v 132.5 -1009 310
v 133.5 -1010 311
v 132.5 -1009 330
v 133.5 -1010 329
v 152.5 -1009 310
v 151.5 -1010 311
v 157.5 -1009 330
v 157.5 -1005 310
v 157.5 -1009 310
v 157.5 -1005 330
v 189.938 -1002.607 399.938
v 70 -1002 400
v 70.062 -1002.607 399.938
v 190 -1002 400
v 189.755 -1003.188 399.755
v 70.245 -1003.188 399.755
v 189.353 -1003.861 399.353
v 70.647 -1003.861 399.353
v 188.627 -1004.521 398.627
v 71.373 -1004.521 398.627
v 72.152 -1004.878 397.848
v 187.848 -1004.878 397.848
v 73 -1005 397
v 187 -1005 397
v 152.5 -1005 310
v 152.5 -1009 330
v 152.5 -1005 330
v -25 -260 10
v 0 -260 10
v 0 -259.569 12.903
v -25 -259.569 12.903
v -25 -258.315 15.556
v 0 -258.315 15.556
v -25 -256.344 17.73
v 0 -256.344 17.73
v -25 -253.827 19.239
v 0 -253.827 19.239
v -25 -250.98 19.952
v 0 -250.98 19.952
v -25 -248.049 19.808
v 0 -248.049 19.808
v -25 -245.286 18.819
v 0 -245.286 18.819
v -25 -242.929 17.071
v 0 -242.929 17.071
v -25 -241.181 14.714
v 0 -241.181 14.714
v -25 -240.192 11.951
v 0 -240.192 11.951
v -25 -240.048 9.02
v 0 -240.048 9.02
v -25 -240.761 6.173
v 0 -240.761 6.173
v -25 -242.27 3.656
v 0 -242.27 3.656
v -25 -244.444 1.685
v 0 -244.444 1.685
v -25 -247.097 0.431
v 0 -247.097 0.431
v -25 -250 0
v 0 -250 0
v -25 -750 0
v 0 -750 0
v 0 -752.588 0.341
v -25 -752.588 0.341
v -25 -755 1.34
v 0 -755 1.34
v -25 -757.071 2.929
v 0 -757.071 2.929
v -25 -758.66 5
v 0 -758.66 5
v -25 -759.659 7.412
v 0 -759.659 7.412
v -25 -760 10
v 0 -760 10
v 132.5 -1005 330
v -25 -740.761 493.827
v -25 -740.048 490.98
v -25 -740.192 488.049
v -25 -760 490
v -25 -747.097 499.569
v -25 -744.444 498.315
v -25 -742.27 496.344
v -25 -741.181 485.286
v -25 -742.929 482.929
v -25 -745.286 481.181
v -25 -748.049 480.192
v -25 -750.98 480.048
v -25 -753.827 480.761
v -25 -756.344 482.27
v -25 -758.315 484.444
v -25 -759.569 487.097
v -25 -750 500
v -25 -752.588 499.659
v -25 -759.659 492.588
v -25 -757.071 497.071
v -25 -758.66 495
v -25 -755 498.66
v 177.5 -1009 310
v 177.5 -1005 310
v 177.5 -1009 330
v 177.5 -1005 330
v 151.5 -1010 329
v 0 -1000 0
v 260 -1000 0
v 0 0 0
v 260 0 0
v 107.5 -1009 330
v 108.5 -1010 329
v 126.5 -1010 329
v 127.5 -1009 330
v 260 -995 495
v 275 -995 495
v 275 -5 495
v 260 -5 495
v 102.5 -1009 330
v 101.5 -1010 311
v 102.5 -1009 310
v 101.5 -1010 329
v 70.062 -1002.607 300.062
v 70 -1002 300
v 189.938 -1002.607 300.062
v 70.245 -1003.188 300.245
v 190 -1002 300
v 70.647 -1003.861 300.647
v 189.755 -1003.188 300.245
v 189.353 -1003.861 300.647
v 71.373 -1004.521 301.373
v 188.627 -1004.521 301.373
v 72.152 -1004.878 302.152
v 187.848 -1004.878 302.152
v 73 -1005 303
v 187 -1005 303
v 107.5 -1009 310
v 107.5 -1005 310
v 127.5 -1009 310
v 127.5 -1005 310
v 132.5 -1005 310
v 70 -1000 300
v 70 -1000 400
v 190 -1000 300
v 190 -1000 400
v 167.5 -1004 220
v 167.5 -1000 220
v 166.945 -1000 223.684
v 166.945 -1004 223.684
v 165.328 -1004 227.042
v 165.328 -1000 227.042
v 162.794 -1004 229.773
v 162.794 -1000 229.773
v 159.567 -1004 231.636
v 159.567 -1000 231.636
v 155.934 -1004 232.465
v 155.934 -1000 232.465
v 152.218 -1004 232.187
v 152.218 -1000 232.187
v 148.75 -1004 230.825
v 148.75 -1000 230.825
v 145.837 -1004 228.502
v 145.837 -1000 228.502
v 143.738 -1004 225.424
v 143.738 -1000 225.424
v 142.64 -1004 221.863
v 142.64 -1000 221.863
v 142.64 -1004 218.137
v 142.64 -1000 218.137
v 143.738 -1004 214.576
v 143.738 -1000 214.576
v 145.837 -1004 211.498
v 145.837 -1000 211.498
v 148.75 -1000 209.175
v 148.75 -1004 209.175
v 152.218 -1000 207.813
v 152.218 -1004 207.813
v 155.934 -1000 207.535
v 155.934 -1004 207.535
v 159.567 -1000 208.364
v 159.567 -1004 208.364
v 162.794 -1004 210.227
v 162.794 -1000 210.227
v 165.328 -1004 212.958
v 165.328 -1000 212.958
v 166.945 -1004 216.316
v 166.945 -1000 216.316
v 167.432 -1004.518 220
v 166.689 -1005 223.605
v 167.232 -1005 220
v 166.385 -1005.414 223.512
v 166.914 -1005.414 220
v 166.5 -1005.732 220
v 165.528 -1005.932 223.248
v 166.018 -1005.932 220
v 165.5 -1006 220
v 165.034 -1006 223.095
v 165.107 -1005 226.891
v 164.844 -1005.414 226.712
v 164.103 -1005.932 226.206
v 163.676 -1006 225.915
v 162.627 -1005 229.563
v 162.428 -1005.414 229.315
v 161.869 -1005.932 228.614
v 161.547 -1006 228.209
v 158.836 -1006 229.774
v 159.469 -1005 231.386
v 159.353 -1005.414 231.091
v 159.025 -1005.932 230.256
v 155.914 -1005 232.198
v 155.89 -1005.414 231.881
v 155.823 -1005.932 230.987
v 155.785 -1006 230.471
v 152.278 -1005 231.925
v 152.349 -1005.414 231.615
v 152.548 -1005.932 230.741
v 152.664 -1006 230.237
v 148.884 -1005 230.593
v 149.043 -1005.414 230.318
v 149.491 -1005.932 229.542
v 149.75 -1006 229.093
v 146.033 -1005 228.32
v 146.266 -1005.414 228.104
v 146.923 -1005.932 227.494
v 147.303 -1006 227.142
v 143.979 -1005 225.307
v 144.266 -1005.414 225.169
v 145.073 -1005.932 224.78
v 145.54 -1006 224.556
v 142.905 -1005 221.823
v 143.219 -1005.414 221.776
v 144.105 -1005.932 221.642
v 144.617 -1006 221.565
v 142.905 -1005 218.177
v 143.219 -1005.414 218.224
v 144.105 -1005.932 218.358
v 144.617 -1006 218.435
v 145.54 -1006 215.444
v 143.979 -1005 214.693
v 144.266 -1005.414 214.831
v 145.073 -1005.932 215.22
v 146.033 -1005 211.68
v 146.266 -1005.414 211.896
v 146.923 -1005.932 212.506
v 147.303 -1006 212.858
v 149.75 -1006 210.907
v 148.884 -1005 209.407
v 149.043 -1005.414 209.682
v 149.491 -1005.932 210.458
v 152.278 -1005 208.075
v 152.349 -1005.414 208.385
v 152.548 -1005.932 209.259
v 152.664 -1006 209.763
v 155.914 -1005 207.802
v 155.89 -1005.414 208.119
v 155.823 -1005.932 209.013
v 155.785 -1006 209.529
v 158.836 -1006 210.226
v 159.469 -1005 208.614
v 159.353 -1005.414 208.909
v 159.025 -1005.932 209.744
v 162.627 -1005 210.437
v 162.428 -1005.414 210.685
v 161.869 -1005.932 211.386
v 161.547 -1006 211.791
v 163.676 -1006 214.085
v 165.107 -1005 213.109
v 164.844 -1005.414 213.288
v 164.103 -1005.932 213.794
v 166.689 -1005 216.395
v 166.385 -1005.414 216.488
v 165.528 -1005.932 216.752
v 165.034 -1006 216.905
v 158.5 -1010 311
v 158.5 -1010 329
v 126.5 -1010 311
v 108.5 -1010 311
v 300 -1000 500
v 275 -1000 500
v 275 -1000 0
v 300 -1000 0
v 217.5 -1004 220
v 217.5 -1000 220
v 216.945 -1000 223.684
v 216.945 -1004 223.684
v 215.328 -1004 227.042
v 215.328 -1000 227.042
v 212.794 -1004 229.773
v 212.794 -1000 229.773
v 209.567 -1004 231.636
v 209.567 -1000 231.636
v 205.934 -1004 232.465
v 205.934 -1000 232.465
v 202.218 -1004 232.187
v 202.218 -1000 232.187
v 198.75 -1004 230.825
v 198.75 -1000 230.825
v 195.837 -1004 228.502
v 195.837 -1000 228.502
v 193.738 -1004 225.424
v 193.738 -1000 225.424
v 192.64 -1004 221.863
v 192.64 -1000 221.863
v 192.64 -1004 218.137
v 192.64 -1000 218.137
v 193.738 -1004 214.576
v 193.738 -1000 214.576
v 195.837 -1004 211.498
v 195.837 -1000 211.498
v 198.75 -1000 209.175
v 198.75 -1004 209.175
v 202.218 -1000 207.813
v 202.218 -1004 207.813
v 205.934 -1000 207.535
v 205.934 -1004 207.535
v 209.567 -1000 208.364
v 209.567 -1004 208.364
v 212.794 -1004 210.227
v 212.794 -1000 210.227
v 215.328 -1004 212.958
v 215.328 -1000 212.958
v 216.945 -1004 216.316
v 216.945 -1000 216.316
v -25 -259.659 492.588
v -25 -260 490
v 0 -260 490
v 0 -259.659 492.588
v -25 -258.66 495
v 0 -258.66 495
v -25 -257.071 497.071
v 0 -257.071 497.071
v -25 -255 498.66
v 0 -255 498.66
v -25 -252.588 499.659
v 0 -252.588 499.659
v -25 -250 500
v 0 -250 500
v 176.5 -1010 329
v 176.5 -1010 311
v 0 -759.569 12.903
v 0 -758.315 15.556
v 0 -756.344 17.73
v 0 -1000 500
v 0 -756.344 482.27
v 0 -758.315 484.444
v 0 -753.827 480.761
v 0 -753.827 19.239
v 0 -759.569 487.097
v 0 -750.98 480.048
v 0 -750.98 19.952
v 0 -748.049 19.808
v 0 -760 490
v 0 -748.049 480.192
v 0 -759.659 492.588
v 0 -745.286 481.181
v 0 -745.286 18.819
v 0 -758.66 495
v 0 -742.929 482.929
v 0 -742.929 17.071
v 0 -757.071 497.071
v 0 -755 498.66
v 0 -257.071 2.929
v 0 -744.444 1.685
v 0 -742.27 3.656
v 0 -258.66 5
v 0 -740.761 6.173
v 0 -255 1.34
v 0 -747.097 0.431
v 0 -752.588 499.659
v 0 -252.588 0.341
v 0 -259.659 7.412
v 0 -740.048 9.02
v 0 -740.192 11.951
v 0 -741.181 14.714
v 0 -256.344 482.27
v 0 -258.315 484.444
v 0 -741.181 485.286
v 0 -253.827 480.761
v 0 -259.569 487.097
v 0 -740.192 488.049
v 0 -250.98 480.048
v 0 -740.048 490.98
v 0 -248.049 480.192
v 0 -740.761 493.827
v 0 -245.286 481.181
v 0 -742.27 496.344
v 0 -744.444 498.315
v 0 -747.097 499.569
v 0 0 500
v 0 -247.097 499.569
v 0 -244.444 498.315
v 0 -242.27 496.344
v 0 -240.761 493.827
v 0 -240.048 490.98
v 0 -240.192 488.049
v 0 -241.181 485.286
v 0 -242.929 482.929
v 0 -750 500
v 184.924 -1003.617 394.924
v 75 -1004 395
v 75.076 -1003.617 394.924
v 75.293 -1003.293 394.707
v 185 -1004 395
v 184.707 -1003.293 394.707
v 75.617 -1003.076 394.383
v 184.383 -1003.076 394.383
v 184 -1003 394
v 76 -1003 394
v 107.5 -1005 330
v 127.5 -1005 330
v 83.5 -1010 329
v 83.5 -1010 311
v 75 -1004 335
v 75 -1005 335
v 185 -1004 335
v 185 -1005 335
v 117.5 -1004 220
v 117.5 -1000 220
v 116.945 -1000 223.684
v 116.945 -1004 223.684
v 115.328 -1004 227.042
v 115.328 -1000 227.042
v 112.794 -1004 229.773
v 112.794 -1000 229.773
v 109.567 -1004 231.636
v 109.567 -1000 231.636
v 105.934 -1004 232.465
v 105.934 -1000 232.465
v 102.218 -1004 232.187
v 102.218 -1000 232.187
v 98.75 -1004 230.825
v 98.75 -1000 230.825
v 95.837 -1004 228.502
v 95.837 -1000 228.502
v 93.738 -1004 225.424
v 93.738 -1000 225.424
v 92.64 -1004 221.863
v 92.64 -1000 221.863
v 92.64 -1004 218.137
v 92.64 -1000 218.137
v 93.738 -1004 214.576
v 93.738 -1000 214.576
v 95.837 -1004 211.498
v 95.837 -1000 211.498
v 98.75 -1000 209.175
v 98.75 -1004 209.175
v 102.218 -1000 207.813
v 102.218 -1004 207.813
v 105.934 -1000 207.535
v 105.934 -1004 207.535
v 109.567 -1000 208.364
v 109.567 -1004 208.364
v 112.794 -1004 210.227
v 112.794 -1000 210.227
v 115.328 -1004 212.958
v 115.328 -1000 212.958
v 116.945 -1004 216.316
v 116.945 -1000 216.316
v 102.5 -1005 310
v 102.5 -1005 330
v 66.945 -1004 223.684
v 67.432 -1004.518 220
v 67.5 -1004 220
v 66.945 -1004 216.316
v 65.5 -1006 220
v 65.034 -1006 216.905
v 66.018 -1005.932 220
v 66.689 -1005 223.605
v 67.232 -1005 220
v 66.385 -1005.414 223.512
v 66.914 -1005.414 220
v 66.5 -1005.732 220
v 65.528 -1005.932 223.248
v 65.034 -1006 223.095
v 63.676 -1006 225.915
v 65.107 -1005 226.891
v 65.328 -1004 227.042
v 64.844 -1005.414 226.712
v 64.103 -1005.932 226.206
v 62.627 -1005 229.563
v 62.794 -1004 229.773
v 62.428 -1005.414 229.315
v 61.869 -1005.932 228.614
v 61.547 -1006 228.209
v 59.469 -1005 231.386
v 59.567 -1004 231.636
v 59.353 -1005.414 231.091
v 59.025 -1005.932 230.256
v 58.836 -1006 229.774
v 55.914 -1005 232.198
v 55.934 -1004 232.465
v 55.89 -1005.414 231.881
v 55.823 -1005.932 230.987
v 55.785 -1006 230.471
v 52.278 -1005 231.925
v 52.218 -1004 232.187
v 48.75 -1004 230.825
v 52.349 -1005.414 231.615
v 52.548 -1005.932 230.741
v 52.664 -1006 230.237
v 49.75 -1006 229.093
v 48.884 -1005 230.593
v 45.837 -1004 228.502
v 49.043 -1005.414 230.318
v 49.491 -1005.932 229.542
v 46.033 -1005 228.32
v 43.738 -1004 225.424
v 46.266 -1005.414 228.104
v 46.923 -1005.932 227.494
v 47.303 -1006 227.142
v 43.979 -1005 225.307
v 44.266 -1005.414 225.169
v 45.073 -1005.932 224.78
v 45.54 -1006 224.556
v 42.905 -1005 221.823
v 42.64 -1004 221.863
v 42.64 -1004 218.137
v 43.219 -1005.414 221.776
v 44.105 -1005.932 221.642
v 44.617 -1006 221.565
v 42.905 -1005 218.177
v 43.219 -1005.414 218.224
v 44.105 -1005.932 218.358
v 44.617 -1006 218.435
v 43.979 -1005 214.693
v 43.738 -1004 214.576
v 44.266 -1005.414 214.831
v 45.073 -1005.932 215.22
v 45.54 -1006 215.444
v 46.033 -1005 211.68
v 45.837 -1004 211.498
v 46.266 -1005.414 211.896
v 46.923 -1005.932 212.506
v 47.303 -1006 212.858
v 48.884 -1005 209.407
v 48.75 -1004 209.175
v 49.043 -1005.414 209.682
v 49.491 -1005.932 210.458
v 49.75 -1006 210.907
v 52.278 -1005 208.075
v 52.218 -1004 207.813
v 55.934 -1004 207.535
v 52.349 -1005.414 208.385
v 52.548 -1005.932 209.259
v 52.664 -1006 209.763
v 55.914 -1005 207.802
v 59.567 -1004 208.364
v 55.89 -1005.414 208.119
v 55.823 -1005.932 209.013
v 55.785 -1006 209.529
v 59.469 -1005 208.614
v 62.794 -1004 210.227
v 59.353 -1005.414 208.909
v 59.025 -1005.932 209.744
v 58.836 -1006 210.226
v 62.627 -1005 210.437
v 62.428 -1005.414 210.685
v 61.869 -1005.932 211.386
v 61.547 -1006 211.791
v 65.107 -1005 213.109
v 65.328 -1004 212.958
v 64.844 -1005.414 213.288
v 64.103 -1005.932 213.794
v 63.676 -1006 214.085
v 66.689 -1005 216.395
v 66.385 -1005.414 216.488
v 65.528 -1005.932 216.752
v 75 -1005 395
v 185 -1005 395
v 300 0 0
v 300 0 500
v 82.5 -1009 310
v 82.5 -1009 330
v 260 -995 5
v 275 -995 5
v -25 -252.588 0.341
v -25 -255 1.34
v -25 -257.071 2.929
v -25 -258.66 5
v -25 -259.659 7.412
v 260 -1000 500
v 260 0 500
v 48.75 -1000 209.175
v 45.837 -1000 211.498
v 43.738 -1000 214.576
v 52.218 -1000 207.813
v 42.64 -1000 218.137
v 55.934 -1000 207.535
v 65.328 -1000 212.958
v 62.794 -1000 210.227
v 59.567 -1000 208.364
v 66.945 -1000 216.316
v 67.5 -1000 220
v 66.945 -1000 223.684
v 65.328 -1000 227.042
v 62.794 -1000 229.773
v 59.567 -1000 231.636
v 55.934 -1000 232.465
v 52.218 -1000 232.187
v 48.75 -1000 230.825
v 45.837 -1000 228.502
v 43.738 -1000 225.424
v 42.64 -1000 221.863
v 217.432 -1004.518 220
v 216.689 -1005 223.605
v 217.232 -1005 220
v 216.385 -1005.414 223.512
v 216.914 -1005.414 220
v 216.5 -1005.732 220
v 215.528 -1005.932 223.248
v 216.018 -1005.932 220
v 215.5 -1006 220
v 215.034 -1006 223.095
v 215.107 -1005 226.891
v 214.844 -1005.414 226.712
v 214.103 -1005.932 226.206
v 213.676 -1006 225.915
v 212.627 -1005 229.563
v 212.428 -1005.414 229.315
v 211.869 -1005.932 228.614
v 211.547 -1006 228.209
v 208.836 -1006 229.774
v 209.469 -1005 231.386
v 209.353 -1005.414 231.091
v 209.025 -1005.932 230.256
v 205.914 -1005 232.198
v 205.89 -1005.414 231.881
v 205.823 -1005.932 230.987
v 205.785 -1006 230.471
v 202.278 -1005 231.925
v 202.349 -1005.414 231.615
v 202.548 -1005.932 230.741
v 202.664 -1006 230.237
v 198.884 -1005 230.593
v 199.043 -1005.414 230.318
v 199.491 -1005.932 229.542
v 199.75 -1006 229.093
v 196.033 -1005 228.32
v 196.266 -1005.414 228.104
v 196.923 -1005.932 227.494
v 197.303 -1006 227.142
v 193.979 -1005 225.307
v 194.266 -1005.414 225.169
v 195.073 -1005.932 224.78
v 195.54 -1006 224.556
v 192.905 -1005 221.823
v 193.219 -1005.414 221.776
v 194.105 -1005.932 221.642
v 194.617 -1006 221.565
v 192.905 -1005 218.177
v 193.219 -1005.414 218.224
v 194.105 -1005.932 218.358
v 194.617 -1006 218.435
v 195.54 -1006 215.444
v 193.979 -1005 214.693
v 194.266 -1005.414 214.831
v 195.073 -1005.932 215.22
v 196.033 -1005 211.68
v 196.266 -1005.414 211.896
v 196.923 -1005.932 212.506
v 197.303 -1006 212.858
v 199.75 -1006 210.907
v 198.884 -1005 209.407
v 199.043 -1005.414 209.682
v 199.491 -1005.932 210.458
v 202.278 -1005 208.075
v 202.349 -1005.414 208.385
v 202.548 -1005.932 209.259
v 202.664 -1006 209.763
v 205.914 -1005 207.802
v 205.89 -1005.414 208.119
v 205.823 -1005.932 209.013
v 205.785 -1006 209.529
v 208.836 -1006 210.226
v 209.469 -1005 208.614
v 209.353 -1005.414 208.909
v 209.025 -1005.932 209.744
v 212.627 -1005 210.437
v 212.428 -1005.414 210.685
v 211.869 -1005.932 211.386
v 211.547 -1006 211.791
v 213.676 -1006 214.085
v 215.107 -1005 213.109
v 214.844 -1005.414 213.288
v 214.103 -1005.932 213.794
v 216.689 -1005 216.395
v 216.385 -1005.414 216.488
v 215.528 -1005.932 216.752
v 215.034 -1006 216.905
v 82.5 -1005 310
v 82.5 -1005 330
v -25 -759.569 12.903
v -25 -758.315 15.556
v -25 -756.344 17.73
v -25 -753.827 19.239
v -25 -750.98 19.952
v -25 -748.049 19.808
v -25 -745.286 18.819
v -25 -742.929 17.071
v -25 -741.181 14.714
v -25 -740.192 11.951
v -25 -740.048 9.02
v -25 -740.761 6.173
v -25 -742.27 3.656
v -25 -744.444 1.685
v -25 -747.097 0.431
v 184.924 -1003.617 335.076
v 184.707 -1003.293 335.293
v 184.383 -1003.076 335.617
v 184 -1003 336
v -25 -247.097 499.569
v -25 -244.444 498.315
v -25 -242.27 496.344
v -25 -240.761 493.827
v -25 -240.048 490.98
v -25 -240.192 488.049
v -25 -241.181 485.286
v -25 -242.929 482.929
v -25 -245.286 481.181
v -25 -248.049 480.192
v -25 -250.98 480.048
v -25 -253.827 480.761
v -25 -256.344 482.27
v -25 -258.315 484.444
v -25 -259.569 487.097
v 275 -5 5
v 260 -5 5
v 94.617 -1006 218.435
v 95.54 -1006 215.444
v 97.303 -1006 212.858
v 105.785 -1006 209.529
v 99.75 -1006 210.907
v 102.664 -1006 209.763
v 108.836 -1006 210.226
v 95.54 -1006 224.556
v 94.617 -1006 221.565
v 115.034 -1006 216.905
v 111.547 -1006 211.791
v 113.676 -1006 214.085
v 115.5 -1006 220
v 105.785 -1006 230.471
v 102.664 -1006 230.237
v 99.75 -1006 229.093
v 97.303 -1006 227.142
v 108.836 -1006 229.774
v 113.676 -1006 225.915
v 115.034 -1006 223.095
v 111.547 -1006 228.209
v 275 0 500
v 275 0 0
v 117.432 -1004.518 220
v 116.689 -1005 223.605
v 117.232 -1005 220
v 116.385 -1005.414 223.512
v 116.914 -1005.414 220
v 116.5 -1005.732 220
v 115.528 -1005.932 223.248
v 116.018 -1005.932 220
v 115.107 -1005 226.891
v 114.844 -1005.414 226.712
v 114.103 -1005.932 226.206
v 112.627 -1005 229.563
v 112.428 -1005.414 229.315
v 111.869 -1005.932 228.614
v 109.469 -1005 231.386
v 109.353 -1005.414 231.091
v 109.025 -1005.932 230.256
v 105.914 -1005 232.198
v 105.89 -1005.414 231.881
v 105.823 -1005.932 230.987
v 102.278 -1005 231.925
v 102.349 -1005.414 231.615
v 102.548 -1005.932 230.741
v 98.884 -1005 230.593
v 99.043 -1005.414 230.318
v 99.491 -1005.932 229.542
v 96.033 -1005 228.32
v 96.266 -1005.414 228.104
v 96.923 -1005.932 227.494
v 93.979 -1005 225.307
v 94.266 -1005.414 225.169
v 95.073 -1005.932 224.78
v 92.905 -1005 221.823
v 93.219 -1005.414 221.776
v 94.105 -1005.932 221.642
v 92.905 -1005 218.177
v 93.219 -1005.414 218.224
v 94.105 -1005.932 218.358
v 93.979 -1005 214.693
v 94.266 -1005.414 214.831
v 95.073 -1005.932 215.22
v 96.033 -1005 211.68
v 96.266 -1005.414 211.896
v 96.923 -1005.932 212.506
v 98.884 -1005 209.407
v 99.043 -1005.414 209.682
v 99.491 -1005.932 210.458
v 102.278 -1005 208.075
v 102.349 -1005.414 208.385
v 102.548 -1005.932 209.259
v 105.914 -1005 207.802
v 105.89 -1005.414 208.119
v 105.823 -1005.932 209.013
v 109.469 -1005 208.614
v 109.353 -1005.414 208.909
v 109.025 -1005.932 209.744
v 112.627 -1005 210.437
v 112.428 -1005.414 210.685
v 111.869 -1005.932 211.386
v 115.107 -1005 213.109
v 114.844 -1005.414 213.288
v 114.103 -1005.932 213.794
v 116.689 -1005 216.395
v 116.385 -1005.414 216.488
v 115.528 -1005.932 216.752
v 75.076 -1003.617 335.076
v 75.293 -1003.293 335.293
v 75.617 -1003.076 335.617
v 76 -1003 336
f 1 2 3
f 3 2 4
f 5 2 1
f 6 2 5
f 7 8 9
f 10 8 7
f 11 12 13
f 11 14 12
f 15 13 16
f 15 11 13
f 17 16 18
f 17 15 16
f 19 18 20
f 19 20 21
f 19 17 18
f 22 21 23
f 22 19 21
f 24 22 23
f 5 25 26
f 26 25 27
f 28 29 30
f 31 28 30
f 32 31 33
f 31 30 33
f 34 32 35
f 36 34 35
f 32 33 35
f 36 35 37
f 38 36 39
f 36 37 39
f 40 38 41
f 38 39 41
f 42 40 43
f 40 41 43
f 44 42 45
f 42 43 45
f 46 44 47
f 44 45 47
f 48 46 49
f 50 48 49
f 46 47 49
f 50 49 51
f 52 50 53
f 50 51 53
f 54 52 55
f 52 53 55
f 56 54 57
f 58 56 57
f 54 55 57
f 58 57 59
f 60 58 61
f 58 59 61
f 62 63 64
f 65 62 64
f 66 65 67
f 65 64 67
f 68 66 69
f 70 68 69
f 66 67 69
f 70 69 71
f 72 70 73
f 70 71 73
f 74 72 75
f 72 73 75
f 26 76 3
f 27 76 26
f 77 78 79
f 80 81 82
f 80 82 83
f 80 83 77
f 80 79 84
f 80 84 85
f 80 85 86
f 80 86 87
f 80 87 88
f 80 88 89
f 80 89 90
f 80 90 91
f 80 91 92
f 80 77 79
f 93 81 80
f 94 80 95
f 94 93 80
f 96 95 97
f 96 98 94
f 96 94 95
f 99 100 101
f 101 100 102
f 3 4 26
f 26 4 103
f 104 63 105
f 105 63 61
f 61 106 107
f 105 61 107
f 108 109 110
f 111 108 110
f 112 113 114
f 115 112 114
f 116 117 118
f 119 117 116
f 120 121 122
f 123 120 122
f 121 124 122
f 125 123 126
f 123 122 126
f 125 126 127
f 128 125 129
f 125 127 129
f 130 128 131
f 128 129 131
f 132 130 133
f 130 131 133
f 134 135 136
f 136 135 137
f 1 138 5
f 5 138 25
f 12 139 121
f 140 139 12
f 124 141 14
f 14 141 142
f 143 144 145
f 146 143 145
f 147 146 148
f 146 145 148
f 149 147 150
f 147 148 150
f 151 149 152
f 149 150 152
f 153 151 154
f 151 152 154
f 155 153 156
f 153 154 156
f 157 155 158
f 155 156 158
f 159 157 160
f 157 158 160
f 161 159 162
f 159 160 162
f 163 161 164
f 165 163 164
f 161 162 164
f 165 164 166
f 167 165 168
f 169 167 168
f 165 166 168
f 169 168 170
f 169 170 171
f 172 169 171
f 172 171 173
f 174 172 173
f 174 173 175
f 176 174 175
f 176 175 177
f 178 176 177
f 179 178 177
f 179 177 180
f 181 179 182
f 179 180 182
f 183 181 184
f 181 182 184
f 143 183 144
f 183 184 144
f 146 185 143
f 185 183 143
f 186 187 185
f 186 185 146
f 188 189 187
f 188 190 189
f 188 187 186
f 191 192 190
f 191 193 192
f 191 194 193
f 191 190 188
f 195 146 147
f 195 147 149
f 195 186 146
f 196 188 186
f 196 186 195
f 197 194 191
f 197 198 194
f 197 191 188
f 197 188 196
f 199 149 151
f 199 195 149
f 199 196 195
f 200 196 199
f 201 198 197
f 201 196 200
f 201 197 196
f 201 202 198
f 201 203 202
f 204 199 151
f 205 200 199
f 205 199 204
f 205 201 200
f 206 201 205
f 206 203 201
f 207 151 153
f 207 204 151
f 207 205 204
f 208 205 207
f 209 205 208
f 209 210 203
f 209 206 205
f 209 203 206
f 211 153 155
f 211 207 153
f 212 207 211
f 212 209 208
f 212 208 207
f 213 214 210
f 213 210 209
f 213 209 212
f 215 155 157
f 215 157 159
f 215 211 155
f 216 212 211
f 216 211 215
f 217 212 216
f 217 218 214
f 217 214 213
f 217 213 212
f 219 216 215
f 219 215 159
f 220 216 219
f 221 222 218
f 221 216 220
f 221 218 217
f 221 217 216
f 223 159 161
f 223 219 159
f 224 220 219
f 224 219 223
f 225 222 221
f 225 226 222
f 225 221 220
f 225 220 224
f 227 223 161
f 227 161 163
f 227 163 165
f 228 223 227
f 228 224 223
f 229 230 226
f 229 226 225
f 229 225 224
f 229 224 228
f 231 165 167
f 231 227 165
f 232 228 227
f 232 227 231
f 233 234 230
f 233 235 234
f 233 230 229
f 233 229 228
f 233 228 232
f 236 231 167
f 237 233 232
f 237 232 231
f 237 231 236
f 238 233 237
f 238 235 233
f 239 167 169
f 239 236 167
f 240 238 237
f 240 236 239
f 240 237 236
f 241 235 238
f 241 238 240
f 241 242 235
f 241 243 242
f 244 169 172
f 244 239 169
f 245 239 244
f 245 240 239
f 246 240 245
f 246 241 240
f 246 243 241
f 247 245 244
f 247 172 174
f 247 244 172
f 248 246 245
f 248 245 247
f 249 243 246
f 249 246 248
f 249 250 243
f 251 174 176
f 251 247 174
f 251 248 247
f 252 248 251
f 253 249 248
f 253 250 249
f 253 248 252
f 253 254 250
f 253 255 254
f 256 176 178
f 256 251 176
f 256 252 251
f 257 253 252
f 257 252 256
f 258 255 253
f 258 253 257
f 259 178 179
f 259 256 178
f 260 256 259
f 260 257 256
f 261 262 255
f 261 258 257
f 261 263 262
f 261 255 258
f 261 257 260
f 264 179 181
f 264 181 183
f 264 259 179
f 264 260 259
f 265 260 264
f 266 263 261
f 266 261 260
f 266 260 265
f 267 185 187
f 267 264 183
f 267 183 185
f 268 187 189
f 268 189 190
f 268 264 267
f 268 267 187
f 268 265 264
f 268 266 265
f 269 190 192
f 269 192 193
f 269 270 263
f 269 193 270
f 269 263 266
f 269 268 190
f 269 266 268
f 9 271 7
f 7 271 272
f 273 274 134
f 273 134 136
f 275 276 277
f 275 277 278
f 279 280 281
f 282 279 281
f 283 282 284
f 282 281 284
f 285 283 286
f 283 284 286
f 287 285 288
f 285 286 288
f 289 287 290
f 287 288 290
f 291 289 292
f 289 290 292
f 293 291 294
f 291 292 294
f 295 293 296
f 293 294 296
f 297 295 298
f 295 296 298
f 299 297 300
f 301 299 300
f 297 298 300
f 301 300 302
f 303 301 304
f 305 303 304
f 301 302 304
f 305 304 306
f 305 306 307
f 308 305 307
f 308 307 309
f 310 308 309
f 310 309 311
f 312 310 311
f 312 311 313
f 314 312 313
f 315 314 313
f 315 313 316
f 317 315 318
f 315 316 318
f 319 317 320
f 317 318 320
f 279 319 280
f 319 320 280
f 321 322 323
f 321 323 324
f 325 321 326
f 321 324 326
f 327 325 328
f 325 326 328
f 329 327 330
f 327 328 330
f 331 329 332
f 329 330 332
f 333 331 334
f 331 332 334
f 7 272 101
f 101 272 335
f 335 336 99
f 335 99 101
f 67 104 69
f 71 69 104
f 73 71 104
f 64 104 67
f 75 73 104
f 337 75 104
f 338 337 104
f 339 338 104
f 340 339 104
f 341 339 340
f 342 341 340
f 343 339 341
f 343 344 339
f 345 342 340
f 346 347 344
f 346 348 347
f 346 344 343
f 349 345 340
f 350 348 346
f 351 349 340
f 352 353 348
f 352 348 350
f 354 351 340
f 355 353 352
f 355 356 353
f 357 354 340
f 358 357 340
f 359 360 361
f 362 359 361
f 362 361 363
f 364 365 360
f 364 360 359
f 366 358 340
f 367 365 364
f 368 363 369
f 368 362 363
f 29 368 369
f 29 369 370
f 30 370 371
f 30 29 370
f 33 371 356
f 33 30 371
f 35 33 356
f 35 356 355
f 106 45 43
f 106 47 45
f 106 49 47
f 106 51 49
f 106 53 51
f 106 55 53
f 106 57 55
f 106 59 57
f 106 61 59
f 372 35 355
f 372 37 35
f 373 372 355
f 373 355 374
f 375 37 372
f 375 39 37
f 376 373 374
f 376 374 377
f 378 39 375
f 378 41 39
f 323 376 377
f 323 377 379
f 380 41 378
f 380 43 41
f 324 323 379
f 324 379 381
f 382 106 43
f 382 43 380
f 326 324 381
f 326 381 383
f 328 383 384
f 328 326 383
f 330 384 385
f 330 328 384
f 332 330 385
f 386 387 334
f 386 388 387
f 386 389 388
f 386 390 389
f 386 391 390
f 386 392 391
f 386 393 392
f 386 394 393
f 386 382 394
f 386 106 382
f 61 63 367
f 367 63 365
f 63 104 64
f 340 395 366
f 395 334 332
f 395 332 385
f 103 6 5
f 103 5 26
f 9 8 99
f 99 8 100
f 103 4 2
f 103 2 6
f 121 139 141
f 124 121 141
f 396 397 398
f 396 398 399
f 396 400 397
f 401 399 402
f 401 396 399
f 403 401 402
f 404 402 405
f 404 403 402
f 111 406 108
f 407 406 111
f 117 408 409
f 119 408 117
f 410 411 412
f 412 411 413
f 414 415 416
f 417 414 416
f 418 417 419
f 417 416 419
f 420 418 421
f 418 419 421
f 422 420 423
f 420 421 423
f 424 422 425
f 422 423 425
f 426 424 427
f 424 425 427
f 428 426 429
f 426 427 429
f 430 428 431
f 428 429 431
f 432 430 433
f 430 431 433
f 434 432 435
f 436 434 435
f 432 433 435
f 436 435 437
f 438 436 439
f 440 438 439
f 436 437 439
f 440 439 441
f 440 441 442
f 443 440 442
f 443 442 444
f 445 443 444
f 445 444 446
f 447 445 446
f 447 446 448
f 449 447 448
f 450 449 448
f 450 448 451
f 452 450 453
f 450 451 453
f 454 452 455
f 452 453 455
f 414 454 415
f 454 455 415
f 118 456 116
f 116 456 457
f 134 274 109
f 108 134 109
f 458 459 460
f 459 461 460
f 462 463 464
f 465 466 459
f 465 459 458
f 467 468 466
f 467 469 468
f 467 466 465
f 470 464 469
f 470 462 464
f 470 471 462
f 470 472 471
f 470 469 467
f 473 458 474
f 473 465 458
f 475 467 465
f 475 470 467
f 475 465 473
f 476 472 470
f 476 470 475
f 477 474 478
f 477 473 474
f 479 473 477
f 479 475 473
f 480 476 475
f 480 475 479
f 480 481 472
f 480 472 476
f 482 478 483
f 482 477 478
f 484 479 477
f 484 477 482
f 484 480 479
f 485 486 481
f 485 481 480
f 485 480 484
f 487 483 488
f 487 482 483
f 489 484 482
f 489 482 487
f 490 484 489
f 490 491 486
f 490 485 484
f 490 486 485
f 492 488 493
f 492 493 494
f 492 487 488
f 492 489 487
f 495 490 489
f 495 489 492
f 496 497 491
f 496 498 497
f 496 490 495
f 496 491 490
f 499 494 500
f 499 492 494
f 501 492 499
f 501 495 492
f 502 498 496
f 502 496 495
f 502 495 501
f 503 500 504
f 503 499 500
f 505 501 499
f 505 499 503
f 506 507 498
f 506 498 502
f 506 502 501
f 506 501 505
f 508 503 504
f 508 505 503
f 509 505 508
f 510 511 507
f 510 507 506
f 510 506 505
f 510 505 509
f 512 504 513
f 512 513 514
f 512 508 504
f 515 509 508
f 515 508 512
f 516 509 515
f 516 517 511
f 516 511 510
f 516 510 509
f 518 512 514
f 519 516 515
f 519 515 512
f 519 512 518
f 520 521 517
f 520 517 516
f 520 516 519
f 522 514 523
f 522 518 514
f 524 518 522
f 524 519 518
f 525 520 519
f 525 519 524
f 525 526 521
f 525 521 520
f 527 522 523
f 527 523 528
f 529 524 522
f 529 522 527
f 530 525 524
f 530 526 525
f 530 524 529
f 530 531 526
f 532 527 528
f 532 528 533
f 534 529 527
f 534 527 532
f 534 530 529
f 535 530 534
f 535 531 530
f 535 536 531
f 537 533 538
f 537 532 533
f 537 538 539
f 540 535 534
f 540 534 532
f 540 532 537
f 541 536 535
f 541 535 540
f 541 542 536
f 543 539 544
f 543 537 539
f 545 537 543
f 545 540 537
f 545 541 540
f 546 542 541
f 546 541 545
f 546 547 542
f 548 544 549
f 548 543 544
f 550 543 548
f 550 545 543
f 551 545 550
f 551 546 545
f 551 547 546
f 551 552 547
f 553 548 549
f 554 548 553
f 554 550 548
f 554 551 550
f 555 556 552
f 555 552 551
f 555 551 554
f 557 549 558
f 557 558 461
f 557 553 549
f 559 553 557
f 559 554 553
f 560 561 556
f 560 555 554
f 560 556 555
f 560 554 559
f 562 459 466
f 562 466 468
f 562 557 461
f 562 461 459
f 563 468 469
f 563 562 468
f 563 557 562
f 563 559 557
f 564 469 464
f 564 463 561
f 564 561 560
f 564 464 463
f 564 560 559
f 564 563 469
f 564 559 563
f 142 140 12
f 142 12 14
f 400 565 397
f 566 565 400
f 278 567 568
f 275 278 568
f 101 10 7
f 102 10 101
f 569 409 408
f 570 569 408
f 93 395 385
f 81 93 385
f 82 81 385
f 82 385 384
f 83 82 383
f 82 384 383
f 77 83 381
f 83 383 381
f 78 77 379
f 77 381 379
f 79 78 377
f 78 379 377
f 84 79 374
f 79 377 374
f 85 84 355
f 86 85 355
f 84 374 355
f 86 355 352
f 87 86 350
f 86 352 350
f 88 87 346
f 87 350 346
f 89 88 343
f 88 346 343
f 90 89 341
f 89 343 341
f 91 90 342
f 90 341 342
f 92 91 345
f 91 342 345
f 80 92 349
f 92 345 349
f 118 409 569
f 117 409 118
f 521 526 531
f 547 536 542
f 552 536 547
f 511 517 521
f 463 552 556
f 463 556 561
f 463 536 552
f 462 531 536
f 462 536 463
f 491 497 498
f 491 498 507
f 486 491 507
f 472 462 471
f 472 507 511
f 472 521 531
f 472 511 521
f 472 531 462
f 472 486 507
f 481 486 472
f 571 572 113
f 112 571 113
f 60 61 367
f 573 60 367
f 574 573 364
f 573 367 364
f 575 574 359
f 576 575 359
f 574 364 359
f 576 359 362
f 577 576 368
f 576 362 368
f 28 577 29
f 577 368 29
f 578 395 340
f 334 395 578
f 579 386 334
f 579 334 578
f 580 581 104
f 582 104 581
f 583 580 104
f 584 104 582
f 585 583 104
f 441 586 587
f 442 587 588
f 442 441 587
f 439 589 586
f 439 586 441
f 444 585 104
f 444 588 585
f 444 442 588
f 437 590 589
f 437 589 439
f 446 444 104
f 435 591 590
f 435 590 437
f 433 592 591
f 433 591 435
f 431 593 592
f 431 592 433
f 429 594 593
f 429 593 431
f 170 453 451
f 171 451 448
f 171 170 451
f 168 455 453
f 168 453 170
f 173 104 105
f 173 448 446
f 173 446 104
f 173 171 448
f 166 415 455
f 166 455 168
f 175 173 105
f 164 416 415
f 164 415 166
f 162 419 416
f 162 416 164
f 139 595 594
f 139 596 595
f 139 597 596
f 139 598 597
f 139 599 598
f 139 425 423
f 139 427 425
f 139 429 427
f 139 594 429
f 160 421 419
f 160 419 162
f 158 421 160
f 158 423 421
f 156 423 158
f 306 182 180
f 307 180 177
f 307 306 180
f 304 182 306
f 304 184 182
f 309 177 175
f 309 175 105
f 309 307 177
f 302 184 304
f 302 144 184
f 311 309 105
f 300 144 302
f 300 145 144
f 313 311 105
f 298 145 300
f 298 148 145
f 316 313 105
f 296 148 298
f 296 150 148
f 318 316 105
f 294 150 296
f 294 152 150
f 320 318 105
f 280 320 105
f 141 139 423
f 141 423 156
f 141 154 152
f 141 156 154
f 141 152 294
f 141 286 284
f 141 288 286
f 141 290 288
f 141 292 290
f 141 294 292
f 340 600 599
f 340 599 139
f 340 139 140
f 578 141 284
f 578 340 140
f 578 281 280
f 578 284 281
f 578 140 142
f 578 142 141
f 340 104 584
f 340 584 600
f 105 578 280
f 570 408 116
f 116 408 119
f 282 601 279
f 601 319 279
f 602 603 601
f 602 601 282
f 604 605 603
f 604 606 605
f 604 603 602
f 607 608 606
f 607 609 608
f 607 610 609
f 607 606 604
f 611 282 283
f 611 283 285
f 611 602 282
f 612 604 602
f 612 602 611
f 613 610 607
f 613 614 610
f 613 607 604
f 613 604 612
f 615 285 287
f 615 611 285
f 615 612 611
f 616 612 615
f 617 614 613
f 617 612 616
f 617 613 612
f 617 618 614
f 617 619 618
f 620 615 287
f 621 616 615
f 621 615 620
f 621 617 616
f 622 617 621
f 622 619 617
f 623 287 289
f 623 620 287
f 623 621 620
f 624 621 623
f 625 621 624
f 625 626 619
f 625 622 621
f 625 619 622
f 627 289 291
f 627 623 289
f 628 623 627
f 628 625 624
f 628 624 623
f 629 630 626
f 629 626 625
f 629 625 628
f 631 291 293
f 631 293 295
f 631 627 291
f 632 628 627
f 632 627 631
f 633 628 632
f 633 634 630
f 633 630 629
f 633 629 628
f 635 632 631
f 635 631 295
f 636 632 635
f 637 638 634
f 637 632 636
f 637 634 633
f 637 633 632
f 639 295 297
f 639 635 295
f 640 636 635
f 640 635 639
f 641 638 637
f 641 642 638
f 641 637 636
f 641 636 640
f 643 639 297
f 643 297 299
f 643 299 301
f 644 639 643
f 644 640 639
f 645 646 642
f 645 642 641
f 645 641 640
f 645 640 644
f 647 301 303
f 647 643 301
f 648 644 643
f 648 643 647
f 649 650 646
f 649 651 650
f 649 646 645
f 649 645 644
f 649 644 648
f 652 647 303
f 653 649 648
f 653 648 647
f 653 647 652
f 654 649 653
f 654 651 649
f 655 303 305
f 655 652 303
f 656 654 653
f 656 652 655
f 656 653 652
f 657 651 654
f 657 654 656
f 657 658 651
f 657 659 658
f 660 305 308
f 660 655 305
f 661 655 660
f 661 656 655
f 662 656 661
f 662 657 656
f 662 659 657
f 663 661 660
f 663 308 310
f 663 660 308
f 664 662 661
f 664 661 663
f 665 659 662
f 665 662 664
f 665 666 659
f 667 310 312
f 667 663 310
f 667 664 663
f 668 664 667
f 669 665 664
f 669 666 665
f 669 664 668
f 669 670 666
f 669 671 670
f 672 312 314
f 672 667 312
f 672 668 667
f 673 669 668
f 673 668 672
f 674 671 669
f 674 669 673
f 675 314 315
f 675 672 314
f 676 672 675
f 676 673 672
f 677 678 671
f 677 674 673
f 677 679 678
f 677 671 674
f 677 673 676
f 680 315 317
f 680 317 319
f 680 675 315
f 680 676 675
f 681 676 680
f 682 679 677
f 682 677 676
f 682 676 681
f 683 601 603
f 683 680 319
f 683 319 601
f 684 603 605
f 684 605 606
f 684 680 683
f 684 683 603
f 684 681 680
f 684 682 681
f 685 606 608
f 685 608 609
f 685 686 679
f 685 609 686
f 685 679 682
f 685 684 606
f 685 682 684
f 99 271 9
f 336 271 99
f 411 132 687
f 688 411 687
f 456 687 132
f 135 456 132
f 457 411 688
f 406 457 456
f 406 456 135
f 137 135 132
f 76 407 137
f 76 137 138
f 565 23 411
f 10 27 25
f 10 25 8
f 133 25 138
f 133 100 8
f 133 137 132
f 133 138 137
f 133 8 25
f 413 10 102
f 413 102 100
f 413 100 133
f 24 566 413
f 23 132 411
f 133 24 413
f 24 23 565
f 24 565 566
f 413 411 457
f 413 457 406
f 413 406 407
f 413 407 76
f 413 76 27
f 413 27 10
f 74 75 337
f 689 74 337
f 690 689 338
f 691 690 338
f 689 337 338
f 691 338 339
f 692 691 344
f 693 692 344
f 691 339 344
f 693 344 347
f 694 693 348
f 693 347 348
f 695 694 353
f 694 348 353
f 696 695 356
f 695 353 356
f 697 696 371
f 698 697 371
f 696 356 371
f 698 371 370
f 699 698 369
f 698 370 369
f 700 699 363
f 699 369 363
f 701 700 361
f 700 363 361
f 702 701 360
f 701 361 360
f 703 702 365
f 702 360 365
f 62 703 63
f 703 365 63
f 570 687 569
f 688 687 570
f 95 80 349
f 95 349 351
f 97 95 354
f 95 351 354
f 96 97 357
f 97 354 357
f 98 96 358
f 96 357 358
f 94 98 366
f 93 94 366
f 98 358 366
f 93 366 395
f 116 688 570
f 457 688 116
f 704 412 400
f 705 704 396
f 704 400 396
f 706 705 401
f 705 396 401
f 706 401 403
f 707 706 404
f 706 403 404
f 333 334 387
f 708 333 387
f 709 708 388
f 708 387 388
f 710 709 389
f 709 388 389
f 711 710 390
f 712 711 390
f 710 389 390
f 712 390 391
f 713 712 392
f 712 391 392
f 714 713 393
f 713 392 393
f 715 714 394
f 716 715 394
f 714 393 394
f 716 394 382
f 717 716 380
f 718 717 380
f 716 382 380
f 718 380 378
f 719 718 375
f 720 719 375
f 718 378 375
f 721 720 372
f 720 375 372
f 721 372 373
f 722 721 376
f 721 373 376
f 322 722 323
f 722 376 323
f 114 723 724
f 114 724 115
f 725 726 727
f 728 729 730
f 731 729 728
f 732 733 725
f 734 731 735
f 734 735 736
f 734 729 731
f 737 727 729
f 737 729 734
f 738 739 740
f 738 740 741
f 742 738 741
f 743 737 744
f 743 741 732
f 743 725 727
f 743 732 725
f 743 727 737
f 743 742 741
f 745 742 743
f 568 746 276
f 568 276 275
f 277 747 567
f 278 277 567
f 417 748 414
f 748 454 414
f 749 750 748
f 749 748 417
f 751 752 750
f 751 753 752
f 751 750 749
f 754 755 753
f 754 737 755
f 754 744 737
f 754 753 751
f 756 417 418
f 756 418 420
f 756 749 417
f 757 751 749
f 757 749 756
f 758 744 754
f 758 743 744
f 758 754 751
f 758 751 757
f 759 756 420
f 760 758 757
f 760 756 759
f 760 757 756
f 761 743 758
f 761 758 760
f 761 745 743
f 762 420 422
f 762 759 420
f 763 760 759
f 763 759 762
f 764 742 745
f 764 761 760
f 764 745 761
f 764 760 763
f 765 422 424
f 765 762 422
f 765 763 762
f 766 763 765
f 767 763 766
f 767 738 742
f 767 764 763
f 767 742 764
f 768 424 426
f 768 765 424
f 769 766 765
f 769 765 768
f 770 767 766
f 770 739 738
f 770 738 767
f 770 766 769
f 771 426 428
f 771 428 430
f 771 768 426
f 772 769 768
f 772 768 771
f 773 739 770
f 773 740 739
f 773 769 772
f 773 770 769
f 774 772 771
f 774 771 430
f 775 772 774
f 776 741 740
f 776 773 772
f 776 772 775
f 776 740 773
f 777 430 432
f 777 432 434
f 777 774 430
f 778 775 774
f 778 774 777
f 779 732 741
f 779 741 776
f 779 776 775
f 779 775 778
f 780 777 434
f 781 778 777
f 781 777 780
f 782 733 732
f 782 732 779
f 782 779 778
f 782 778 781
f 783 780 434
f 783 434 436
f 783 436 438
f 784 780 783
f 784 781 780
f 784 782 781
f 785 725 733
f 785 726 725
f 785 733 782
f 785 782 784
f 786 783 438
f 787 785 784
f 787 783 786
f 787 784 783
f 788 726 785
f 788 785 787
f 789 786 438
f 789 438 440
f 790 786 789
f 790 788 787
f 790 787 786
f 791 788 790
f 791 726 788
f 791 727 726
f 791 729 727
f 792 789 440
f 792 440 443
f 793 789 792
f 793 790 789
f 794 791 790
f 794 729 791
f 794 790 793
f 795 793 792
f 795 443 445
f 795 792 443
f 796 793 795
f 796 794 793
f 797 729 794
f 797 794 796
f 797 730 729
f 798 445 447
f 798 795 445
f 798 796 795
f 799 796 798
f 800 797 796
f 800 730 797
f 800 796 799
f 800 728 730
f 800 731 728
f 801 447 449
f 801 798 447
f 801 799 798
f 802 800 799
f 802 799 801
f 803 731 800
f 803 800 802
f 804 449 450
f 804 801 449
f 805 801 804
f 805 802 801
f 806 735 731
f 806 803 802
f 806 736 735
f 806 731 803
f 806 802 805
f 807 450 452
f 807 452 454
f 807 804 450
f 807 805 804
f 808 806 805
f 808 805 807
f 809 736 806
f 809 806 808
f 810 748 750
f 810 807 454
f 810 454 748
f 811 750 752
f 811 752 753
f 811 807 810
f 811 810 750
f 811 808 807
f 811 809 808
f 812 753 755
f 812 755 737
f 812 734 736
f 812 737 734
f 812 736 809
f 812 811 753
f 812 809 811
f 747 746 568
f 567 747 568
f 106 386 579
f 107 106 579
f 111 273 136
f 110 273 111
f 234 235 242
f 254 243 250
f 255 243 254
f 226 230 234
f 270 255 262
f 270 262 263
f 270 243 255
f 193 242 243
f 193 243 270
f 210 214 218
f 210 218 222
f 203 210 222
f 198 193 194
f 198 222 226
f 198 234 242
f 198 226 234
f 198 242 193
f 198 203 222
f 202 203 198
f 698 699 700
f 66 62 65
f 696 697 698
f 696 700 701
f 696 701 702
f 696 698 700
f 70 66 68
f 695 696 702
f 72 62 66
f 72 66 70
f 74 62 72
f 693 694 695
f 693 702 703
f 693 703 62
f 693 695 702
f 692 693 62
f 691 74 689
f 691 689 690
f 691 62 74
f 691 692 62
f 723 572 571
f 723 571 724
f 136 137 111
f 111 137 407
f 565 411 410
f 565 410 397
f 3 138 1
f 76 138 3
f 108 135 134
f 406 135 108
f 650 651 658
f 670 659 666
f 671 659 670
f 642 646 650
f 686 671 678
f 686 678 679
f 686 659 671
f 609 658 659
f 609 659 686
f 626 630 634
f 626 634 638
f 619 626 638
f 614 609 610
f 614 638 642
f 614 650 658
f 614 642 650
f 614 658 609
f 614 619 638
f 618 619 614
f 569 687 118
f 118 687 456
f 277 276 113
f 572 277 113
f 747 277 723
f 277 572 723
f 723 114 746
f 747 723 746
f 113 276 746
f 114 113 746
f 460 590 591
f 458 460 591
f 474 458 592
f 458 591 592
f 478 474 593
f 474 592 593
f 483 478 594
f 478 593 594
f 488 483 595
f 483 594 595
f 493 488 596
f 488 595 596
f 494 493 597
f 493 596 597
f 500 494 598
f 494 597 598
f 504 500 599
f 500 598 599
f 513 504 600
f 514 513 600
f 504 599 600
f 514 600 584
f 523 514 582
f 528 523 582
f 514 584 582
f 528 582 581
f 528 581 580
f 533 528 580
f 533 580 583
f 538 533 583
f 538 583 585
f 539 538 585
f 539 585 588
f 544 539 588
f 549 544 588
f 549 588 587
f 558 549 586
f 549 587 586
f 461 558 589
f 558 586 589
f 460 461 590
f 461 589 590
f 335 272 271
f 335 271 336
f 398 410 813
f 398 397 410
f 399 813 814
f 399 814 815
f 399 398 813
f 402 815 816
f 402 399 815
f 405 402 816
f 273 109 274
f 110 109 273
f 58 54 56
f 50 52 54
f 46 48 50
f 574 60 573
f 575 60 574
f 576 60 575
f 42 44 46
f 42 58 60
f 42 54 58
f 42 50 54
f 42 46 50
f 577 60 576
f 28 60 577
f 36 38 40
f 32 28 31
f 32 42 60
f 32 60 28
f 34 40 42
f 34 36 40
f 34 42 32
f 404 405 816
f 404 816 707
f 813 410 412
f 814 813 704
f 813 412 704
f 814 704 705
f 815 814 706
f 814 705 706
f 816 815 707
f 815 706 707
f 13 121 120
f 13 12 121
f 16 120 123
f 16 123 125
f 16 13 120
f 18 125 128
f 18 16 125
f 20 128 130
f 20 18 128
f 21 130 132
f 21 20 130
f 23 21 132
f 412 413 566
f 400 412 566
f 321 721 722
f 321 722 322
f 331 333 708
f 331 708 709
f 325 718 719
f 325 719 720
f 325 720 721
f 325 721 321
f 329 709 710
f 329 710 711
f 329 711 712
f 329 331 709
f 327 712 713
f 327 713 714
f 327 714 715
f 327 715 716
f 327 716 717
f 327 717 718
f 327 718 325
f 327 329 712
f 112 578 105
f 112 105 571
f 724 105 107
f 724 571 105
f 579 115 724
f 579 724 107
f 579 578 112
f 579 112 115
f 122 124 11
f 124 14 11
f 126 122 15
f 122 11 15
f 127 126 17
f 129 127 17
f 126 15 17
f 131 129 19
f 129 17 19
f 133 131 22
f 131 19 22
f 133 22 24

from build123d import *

# Parameters (mm, degrees)
F0_W      = 300
F0_H      = 500
F1_DEPTH  = 1000
F3_W      = 1000
F3_H      = 500
F3_W_2    = 990
F3_H_2    = 490
F4_DEPTH  = 15
F6_DEPTH  = 25
F7_W      = 120
F7_H      = 100
F8_DEPTH  = 5
F9_W      = 20
F9_H      = 20
F10_DEPTH = 5
F11_W     = 110
F11_H     = 60
F12_DEPTH = 2
F14_R     = 12.5
F15_DEPTH = 6
F16_R     = 2
F17_R     = 3
F18_SIZE  = 1
F19_R     = 1


with BuildPart() as f1:
    # F0 (on Front) → F1 (new body)
    with BuildSketch(Plane.XZ):
        with Locations((150, 250)):
            Rectangle(F0_W, F0_H)
    extrude(amount=F1_DEPTH)

    # F3 (on offset) → F4 (cut)
    with BuildSketch(Plane.YZ.offset(275)):
        with Locations((-500, 250)):
            Rectangle(F3_W, F3_H)
        with Locations((-500, 250)):
            Rectangle(F3_W_2, F3_H_2, mode=Mode.SUBTRACT)
    extrude(amount=-F4_DEPTH, mode=Mode.SUBTRACT)

    # F5 (on face) → F6 (join)
    with BuildSketch(Plane(origin=(0, 0, 0), x_dir=(0, -1, 0), z_dir=(-1, 0, 0))):
        with BuildLine():
            ThreePointArc((250.000000113, 500), (242.9289321482, 482.9289322281), (260, 490))
            ThreePointArc((260, 490), (257.0710678518, 497.0710677719), (250.000000113, 500))
        make_face()
        with BuildLine():
            ThreePointArc((260, 10), (242.9289321881, 17.0710678119), (250, 0))
            ThreePointArc((250, 0), (257.0710678119, 2.9289321881), (260, 10))
        make_face()
        with BuildLine():
            ThreePointArc((760, 10), (742.9289321881, 17.0710678119), (750, 0))
            ThreePointArc((750, 0), (757.0710678119, 2.9289321881), (760, 10))
        make_face()
        with BuildLine():
            ThreePointArc((760, 490), (757.0710678119, 497.0710678119), (750, 500))
            ThreePointArc((750, 500), (742.9289321881, 482.9289321881), (760, 490))
        make_face()
    extrude(amount=F6_DEPTH)

    # F7 (on face) → F8 (join)
    with BuildSketch(Plane.XZ.offset(1000)):
        with Locations((130, 350)):
            Rectangle(F7_W, F7_H)
    extrude(amount=F8_DEPTH)

    # F9 (on face) → F10 (join)
    with BuildSketch(Plane.XZ.offset(1005)):
        with Locations((92.5, 320)):
            Rectangle(F9_W, F9_H)
        with Locations((117.5, 320)):
            Rectangle(F9_W, F9_H)
        with Locations((142.5, 320)):
            Rectangle(F9_W, F9_H)
        with Locations((167.5, 320)):
            Rectangle(F9_W, F9_H)
    extrude(amount=F10_DEPTH)

    # F11 (on face) → F12 (cut)
    with BuildSketch(Plane.XZ.offset(1005)):
        with Locations((130, 365)):
            Rectangle(F11_W, F11_H)
    extrude(amount=-F12_DEPTH, mode=Mode.SUBTRACT)

    # F14 (on face) → F15 (join)
    with BuildSketch(Plane.XZ.offset(1000)):
        with Locations((55, 220)):
            Circle(F14_R)
        with Locations((105, 220)):
            Circle(F14_R)
        with Locations((155, 220)):
            Circle(F14_R)
        with Locations((205, 220)):
            Circle(F14_R)
    extrude(amount=F15_DEPTH)

    # F16
    f16_edges = [f1.edges().sort_by_distance(p)[0] for p in [
        (42.5, -1006, 220),
        (92.5, -1006, 220),
        (142.5, -1006, 220),
        (192.5, -1006, 220),
    ]]
    fillet(f16_edges, radius=F16_R)

    # F17
    f17_edges = [f1.edges().sort_by_distance(p)[0] for p in [
        (70, -1005, 350),
        (130, -1005, 300),
        (190, -1005, 350),
        (130, -1005, 400),
    ]]
    fillet(f17_edges, radius=F17_R)

    # F18
    f18_edges = [f1.edges().sort_by_distance(p)[0] for p in [
        (92.5, -1010, 330),
        (82.5, -1010, 320),
        (92.5, -1010, 310),
        (102.5, -1010, 320),
        (117.5, -1010, 330),
        (107.5, -1010, 320),
        (117.5, -1010, 310),
        (127.5, -1010, 320),
        (142.5, -1010, 330),
        (132.5, -1010, 320),
        (142.5, -1010, 310),
        (152.5, -1010, 320),
        (167.5, -1010, 330),
        (157.5, -1010, 320),
        (167.5, -1010, 310),
        (177.5, -1010, 320),
    ]]
    chamfer(f18_edges, length=F18_SIZE)

    # F19
    f19_edges = [f1.edges().sort_by_distance(p)[0] for p in [
        (130, -1003, 395),
        (75, -1003, 365),
        (130, -1003, 335),
        (185, -1003, 365),
    ]]
    fillet(f19_edges, radius=F19_R)


solid = f1.part
